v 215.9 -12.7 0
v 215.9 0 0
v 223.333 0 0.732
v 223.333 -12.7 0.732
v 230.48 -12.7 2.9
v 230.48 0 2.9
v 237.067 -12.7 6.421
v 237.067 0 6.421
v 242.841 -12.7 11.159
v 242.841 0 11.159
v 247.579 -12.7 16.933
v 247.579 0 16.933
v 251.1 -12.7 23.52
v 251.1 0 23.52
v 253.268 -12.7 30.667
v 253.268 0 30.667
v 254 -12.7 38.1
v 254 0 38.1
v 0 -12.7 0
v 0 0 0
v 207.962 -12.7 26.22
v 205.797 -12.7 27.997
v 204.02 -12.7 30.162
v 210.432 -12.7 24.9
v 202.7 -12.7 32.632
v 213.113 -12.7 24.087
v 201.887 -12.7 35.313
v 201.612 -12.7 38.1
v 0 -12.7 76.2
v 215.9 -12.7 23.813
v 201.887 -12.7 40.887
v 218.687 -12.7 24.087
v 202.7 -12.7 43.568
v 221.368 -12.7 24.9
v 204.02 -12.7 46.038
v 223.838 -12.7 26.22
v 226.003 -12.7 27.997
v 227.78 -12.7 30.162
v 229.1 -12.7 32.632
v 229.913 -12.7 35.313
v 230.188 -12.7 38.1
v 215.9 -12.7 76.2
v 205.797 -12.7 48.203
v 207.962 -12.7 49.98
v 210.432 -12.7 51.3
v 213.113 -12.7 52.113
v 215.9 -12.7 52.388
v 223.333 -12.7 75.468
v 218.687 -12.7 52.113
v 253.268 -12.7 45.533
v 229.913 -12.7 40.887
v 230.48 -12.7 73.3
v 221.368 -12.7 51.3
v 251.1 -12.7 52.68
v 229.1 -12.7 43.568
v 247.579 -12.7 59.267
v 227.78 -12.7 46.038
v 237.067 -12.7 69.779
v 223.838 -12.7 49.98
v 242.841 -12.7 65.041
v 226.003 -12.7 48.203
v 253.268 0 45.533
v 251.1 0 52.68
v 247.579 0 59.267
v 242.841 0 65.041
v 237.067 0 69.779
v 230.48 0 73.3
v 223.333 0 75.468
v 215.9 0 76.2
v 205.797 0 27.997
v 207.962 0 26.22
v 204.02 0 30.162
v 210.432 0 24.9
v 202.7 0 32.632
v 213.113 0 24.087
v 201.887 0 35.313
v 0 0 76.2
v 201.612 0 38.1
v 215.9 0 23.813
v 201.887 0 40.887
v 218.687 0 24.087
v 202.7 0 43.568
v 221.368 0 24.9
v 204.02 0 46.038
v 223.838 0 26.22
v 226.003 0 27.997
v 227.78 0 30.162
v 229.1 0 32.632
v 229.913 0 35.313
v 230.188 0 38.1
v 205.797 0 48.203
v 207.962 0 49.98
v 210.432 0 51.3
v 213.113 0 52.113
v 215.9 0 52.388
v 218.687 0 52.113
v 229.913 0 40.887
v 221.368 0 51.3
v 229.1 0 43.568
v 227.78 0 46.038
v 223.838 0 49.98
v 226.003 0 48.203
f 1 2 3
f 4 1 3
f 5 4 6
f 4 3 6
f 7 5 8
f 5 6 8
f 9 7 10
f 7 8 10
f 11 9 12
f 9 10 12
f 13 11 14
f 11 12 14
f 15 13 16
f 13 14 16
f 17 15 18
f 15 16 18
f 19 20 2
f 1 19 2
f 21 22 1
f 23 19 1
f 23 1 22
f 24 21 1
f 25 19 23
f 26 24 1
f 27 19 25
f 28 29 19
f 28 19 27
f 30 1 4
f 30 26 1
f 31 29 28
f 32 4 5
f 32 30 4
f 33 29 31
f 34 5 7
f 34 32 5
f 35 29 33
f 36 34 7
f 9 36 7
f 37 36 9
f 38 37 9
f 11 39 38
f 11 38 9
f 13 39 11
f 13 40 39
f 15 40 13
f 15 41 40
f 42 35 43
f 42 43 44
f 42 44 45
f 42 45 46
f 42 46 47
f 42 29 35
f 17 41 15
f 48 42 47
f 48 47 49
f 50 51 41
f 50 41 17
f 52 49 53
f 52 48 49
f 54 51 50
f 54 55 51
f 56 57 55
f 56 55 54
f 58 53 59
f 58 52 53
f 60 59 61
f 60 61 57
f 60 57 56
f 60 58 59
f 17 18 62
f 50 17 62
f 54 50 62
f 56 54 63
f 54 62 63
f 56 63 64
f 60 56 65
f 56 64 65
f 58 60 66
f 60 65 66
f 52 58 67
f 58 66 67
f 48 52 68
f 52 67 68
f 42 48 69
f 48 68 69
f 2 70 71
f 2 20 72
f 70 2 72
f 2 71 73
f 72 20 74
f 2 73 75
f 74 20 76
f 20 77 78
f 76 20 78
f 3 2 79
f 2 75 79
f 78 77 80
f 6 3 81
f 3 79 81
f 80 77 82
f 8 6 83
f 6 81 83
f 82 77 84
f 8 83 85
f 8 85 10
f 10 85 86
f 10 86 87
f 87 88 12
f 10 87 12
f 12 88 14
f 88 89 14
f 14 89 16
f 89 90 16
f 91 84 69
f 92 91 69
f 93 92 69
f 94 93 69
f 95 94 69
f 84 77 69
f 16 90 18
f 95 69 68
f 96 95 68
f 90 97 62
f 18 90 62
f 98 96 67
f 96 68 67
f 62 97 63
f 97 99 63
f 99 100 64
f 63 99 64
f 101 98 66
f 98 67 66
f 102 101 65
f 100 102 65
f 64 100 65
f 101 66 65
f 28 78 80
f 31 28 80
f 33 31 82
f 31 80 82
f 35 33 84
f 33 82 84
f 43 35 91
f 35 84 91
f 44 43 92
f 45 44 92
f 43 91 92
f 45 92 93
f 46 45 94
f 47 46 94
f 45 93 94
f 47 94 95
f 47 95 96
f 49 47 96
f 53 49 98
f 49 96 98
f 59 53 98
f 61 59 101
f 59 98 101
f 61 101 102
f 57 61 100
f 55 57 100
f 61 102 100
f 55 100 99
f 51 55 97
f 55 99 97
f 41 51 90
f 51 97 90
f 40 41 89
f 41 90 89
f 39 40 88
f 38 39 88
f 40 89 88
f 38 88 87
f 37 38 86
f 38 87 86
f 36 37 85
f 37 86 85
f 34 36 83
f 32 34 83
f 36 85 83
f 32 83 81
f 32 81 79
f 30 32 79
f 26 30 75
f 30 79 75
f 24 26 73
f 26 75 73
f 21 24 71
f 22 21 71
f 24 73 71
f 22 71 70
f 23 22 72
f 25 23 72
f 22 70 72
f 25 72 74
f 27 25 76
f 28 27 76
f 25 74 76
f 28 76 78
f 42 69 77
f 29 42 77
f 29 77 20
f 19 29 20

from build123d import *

# Parameters (mm, degrees)
F1_DEPTH = 12.7


with BuildPart() as f1:
    # F0 (on Front) → F1 (new body)
    with BuildSketch(Plane.XZ):
        with BuildLine():
            Line((0, 38.1), (0, 0))
            Line((0, 0), (215.9, 0))
            ThreePointArc((215.9, 0), (242.840768, 11.159232), (254, 38.1))
            ThreePointArc((254, 38.1), (242.840768, 65.040768), (215.9, 76.2))
            Line((215.9, 76.2), (0, 76.2))
            Line((0, 76.2), (0, 38.1))
        make_face()
        with BuildLine():
            ThreePointArc((230.1875, 38.1), (215.9, 23.8125), (201.6125, 38.1))
            ThreePointArc((201.6125, 38.1), (215.9, 52.3875), (230.1875, 38.1))
        make_face(mode=Mode.SUBTRACT)
    extrude(amount=F1_DEPTH)


solid = f1.part
